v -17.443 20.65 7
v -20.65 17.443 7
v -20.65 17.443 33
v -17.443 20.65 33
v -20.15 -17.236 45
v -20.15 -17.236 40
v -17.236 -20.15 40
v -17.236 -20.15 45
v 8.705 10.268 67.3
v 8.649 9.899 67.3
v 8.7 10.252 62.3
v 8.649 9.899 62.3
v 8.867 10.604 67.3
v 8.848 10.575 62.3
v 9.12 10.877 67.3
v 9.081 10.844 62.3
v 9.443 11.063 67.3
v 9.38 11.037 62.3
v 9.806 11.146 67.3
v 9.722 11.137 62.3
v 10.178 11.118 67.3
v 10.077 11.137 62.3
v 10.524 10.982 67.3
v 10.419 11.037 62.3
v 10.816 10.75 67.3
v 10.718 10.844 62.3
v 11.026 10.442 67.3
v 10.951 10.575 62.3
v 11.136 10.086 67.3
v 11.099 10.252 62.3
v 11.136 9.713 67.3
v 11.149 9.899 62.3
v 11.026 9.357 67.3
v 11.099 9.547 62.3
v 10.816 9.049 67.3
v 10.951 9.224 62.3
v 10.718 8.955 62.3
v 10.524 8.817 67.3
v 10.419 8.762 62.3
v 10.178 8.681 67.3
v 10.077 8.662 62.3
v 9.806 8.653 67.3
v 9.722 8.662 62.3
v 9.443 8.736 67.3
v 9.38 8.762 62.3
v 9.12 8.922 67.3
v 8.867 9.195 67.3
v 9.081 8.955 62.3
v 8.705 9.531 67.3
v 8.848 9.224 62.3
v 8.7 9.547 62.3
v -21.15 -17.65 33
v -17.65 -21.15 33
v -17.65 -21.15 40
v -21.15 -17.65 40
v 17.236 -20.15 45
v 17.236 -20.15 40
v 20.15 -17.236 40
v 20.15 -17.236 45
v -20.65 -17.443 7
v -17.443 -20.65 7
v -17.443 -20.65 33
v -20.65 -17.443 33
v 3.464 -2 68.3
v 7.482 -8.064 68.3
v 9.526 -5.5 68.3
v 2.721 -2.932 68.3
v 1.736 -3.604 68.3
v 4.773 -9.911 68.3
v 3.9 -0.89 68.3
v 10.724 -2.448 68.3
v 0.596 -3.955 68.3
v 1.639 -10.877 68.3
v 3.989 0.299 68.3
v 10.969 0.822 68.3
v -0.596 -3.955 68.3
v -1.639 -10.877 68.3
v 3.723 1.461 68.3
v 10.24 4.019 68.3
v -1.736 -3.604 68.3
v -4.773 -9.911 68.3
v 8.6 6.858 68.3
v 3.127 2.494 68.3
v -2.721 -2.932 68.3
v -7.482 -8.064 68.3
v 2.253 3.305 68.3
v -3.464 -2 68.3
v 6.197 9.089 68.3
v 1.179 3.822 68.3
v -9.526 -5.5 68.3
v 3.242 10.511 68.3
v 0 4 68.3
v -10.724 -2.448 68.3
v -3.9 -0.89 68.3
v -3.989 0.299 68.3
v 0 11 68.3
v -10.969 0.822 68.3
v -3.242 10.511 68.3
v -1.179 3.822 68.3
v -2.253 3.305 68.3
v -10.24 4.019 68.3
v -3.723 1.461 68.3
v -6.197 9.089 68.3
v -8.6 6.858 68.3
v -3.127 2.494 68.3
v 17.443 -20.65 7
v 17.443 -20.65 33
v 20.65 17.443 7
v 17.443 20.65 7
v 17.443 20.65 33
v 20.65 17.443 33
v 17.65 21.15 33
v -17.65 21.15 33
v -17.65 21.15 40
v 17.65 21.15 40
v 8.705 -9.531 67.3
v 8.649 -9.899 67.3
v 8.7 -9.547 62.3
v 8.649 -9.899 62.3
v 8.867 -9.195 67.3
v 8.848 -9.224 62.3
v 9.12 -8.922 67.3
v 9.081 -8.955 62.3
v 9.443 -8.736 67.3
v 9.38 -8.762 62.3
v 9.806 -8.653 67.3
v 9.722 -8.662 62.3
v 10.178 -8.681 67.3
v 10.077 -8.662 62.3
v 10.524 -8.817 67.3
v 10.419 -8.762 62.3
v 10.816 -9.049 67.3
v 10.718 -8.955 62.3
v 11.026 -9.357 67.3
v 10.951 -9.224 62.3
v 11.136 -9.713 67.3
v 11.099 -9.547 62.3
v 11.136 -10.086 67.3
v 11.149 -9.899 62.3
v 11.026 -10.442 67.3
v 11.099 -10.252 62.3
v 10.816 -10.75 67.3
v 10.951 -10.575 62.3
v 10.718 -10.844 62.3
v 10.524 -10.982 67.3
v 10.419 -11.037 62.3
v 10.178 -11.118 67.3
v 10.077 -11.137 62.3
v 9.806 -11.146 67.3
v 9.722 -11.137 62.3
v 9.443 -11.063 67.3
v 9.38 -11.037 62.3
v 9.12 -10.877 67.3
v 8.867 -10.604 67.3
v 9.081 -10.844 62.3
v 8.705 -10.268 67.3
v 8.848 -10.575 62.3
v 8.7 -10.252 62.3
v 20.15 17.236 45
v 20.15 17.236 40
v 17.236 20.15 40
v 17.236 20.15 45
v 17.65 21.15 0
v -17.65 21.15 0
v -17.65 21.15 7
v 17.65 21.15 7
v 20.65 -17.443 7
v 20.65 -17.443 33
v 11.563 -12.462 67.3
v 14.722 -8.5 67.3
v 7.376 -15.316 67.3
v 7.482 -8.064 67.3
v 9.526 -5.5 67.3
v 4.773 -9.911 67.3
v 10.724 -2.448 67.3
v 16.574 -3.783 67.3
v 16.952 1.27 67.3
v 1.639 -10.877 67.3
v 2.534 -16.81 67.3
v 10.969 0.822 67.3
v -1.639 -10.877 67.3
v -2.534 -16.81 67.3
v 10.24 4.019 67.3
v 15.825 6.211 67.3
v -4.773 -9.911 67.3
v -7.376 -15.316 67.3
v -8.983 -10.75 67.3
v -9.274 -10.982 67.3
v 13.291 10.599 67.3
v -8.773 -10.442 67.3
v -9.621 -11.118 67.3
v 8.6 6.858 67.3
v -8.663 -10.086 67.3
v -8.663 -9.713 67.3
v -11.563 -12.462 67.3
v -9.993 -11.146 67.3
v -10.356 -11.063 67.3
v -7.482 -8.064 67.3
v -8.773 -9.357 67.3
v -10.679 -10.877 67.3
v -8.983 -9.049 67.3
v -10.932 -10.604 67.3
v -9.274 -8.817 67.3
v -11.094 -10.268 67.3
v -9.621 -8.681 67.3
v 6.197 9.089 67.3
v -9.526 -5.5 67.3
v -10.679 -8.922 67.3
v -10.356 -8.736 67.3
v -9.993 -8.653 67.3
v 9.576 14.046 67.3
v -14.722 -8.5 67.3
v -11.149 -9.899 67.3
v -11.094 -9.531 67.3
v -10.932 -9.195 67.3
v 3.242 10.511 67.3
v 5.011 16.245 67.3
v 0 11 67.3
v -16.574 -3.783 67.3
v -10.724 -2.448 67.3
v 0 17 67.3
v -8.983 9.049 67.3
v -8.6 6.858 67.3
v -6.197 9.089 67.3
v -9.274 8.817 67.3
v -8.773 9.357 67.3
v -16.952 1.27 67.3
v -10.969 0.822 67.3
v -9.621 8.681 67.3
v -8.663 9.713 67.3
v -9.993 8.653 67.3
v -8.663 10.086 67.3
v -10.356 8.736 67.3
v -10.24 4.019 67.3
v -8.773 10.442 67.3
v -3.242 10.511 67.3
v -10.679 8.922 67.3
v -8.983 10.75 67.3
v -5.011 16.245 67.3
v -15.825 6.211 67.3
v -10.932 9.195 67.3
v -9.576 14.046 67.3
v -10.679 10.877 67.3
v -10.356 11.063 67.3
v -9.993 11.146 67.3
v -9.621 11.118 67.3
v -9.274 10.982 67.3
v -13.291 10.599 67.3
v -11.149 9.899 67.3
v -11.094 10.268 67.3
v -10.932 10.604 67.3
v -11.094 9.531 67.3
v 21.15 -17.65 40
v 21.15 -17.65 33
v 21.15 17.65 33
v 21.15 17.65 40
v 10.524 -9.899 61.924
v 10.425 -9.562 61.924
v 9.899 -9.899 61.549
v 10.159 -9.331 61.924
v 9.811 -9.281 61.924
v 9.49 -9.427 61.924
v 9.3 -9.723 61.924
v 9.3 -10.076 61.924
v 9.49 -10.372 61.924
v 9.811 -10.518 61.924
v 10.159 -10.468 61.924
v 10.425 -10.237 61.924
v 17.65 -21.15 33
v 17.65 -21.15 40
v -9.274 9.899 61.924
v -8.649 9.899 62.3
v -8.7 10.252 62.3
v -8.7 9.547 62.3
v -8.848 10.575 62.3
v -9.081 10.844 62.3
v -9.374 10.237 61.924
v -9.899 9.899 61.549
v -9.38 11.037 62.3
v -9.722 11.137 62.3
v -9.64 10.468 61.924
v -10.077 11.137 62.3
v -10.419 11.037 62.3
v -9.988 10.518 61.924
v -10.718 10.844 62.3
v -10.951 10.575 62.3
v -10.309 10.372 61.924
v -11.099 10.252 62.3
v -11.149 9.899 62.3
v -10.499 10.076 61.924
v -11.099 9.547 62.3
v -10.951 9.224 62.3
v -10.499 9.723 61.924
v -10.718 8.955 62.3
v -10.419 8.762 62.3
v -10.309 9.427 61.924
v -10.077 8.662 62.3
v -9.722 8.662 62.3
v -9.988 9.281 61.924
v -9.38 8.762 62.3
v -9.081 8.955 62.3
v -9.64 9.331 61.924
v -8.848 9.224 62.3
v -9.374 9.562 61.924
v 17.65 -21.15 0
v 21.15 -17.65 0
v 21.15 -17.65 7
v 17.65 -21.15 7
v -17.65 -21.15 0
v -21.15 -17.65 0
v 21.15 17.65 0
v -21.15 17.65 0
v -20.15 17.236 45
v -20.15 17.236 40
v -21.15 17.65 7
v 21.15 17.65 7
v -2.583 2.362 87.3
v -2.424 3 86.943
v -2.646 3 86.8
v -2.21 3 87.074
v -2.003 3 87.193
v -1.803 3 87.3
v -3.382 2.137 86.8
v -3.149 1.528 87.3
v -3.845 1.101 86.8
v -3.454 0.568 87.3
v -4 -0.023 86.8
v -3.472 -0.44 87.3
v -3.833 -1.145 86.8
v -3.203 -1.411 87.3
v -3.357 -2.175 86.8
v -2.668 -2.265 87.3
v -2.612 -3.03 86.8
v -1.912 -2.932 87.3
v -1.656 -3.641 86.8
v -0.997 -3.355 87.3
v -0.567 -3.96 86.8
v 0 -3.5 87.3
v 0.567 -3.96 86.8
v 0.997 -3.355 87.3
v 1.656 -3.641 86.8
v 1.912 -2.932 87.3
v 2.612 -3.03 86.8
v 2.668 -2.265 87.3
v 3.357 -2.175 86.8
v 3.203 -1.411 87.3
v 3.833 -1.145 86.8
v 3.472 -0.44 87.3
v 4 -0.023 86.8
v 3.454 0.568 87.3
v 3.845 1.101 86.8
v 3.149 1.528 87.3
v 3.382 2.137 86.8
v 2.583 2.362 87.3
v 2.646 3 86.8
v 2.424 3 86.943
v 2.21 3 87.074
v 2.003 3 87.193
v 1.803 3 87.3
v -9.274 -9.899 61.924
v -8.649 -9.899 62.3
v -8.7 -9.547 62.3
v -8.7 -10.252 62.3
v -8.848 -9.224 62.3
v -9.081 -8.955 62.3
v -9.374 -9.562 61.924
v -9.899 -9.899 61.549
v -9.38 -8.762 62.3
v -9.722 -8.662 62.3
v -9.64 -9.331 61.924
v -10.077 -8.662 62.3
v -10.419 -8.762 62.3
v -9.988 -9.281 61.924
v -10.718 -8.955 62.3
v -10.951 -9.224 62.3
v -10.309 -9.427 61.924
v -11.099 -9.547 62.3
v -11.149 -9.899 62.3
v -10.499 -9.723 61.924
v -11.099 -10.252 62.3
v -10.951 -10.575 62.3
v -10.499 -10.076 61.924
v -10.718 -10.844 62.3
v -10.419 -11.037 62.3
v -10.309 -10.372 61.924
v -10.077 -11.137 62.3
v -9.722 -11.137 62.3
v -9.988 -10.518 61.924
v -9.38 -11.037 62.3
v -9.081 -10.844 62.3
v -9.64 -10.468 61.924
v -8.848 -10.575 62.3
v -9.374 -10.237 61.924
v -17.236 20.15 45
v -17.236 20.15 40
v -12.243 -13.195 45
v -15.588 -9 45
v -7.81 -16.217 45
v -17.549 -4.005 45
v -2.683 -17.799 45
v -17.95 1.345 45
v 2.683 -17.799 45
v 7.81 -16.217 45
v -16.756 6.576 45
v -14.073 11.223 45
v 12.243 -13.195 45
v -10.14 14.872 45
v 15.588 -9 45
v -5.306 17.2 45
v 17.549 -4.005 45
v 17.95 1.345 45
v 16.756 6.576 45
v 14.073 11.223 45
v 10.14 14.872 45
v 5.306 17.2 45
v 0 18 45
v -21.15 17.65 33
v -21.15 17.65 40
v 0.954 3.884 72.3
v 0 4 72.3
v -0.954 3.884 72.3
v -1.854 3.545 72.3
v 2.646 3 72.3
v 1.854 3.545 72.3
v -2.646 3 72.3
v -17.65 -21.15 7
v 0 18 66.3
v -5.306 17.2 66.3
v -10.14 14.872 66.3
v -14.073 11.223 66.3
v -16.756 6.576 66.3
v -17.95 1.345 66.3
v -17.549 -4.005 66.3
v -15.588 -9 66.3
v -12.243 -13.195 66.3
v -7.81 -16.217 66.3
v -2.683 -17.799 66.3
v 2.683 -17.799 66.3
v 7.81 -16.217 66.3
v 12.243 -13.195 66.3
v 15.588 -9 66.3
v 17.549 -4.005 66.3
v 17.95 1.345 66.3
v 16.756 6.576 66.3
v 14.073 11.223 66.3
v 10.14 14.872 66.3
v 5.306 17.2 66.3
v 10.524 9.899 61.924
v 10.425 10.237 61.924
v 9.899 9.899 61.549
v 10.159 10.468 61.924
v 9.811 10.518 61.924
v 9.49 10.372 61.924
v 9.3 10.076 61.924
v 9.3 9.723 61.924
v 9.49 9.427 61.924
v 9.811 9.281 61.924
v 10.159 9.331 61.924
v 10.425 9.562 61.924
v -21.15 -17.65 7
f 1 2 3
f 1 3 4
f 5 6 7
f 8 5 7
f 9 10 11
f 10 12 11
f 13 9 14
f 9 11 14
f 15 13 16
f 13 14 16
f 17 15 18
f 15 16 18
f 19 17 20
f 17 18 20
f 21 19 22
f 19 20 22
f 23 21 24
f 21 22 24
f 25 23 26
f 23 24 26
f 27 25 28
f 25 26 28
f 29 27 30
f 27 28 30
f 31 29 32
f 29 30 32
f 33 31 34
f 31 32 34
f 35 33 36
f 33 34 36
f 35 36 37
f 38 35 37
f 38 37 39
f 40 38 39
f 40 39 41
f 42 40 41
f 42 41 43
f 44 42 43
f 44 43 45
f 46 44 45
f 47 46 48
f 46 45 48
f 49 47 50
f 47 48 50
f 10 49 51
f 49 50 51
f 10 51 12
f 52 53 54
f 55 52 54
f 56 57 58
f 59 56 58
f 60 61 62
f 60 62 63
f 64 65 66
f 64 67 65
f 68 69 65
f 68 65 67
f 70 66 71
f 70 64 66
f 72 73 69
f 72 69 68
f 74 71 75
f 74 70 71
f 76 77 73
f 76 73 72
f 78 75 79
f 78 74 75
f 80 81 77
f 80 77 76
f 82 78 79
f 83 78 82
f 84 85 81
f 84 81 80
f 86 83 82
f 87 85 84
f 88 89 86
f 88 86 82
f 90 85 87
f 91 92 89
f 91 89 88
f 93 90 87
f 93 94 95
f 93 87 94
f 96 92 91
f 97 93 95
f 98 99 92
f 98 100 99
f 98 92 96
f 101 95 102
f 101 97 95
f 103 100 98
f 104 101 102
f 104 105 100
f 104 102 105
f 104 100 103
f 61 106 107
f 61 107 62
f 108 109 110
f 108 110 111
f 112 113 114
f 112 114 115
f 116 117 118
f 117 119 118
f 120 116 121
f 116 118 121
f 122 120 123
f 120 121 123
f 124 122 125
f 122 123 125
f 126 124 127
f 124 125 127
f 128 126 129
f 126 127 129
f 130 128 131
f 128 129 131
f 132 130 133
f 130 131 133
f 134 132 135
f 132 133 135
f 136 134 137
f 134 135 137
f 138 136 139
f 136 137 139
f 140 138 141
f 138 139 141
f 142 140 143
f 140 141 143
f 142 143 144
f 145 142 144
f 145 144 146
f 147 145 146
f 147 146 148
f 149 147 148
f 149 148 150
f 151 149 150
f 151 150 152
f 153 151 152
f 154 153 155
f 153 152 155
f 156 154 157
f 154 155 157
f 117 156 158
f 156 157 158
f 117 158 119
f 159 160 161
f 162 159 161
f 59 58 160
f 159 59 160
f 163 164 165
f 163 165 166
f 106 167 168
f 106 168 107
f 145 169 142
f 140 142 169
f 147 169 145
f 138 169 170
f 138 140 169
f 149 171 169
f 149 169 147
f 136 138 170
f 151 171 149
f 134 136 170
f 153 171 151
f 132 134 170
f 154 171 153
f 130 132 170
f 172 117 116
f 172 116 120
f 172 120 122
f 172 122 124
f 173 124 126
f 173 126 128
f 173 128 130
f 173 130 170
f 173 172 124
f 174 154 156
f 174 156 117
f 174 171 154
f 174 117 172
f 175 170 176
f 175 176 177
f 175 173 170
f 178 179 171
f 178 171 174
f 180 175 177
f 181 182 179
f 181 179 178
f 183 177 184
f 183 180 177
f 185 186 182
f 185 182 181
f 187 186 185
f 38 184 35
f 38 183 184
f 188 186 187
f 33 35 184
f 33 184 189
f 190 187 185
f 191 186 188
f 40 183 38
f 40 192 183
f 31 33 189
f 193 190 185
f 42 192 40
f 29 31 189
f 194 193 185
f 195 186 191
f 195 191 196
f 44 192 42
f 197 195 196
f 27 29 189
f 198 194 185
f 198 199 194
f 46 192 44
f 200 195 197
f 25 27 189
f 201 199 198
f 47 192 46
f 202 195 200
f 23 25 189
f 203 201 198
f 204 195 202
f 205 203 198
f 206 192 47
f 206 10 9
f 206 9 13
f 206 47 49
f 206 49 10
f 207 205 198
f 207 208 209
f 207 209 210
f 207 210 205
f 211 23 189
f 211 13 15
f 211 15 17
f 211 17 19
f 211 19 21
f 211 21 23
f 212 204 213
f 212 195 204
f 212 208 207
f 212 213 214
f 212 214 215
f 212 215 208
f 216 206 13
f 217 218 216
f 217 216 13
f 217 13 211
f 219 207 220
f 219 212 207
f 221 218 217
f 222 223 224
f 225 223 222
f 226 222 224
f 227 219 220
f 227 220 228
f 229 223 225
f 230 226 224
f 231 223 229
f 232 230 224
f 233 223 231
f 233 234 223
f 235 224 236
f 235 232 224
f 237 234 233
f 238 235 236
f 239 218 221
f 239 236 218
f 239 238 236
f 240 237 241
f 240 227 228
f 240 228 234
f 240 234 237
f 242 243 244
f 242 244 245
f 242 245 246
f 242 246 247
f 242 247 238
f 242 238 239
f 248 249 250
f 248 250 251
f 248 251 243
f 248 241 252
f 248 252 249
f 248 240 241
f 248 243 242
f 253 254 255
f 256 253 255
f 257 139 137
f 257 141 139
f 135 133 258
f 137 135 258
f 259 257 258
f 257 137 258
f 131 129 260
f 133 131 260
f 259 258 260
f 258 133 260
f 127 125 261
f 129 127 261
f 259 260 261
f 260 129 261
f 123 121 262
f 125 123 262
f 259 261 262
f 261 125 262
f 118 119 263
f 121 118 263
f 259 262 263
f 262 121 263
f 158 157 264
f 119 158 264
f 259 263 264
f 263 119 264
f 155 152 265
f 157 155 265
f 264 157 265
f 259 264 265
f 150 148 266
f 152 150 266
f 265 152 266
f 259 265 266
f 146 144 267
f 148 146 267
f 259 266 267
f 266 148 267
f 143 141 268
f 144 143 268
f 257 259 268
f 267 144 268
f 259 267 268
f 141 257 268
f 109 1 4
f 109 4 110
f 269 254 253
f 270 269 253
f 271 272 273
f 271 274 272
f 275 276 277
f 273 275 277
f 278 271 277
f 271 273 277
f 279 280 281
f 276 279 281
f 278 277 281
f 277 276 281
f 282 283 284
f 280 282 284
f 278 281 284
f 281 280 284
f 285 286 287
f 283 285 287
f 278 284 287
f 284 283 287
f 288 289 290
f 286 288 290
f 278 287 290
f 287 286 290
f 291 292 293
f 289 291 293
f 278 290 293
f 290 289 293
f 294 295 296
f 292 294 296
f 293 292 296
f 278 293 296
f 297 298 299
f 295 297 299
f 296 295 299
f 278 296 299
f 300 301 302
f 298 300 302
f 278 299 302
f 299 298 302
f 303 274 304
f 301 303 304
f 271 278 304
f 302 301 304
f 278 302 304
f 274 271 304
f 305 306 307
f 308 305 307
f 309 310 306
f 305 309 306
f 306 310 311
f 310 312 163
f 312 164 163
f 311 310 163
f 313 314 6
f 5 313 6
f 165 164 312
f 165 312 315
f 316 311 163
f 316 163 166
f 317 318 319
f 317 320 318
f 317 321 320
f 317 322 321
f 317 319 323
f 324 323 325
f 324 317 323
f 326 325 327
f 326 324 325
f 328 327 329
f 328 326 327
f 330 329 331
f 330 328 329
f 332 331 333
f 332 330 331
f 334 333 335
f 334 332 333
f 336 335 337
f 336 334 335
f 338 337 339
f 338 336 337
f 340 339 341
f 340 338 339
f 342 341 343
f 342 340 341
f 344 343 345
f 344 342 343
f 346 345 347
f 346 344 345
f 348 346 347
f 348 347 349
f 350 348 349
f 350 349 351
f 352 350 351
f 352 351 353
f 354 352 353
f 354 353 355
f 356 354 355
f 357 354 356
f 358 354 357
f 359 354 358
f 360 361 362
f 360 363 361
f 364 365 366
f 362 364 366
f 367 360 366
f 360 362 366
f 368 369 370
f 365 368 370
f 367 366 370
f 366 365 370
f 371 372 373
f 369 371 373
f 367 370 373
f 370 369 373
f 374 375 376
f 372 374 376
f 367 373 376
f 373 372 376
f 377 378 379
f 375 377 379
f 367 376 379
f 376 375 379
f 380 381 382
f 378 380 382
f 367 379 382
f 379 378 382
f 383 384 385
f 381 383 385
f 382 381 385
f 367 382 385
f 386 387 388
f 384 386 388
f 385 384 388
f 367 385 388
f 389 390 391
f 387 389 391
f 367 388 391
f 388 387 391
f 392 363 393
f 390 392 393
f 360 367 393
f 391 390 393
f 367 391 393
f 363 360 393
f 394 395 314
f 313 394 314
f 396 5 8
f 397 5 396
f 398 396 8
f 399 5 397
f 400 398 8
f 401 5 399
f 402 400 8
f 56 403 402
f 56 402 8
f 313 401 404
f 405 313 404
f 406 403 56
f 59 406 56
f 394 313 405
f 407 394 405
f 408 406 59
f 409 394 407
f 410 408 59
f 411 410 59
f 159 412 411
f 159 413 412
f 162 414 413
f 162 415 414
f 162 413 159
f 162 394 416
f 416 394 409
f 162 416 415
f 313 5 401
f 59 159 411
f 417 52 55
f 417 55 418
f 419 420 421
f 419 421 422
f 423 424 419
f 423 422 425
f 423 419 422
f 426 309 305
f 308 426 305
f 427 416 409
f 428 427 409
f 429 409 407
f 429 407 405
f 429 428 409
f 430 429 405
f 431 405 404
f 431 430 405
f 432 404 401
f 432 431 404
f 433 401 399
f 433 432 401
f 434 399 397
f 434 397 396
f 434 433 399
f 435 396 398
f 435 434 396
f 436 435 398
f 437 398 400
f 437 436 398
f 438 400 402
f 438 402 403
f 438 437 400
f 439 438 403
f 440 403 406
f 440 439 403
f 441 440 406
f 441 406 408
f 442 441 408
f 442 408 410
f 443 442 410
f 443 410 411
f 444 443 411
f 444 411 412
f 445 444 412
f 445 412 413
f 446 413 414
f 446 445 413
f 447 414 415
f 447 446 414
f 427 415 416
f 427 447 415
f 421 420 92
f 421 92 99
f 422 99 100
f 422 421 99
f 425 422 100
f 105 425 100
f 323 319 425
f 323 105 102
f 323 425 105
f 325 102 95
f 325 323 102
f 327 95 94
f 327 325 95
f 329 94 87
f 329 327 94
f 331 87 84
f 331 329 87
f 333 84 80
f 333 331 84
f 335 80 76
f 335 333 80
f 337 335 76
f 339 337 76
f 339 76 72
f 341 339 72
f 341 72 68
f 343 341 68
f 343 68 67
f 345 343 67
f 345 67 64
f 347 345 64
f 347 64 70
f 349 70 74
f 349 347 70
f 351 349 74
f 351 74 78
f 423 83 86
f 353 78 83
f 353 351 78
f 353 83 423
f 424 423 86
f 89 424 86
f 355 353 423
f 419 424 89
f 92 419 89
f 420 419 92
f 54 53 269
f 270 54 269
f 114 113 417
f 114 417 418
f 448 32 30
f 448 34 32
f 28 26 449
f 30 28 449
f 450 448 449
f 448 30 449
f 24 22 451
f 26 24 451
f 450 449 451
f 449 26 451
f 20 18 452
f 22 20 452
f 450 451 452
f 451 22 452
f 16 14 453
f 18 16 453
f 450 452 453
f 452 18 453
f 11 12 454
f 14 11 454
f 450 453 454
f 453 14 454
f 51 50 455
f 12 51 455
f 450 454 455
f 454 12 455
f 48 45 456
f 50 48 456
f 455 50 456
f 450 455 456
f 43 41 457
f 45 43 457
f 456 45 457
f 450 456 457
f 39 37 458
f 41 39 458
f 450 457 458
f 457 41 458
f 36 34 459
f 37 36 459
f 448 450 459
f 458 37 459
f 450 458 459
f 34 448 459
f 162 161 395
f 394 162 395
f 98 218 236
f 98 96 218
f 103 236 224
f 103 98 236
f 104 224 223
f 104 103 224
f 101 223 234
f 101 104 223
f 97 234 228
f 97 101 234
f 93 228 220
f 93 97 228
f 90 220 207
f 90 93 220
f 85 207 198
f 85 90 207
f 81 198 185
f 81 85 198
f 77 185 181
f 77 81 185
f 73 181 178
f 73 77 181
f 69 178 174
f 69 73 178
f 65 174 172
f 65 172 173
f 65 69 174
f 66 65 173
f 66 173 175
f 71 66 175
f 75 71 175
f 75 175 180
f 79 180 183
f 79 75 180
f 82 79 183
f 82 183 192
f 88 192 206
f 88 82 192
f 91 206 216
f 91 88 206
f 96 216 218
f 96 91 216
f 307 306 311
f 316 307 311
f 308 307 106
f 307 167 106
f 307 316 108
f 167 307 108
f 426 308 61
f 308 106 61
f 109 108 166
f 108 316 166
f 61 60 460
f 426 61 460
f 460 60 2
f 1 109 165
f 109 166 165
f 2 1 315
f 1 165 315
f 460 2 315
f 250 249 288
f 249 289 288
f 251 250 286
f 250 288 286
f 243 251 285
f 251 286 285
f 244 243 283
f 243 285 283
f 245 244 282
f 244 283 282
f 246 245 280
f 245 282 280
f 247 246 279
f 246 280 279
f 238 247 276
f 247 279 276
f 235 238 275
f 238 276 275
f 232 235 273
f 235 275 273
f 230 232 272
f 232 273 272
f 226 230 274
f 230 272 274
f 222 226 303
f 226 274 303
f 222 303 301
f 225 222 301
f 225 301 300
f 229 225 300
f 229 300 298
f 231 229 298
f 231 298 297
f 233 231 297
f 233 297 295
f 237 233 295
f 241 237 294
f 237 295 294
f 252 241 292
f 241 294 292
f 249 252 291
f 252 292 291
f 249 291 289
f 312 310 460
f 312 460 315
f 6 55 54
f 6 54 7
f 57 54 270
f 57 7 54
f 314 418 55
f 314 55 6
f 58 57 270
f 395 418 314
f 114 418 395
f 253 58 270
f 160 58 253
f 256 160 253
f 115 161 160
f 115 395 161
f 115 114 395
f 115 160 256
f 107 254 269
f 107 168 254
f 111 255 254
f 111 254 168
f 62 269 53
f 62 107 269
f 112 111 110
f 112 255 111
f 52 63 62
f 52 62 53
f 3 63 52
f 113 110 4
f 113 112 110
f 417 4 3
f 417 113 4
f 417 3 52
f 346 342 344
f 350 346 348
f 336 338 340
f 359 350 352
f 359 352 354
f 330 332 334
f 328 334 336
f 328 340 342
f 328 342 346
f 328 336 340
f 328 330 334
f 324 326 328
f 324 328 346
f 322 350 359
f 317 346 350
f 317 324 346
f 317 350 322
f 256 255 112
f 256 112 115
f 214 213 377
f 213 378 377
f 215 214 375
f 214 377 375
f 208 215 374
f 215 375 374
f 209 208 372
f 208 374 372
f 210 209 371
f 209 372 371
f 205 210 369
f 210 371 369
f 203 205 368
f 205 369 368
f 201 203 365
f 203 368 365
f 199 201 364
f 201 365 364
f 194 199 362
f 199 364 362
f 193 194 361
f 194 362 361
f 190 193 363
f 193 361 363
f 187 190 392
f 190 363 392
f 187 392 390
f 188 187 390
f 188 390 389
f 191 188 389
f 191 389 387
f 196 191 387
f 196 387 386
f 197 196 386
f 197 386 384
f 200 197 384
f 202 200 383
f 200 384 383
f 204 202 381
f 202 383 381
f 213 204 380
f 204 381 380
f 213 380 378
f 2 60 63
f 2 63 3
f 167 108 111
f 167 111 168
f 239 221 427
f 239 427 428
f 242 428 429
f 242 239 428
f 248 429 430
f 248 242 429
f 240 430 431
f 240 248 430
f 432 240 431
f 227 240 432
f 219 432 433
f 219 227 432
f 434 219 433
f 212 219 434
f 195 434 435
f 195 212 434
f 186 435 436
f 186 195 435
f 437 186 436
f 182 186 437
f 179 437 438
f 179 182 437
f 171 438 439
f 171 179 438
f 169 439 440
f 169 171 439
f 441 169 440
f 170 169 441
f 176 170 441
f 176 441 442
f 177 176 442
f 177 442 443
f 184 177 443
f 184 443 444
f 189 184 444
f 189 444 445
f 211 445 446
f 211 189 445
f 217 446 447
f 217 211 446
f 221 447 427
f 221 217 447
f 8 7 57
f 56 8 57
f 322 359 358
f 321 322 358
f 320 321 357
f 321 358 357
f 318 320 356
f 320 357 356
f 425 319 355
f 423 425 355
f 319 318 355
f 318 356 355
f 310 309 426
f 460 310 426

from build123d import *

# Parameters (mm, degrees)
SKIZZE1_W                       = 42.3
SKIZZE1_H                       = 42.3
AUFSATZ_LINEAR_AUSTRAGEN1_DEPTH = 40
FASE1_SIZE                      = 3.5
SCHNITT_LINEAR_AUSTRAGEN1_DEPTH = 15
FASE2_SIZE                      = 0.5
AUFSATZ_LINEAR_AUSTRAGEN2_DEPTH = 5
M3_GEWINDEBOHRUNG1_D            = 2.5
M3_GEWINDEBOHRUNG1_DEPTH        = 5
M3_GEWINDEBOHRUNG1_TIP          = 0.751075774
FASE3_SIZE                      = 1
SCHNITT_LINEAR_START            = -7
SCHNITT_LINEAR_AUSTRAGEN2_DEPTH = 26


with BuildPart() as part:
    # Skizze1 → Aufsatz-Linear austragen1 (new body)
    with BuildSketch(Plane.XY):
        Rectangle(SKIZZE1_W, SKIZZE1_H)
    extrude(amount=AUFSATZ_LINEAR_AUSTRAGEN1_DEPTH)

    # Skizze3 → Rotation1 (revolve)
    with BuildSketch(Plane(origin=(0, 0, 0), x_dir=(0, 0, -1), z_dir=(1, 0, 0))):
        Polygon((-40, 18), (-67.3, 18), (-67.3, 11), (-68.3, 11), (-68.3, 4), (-87.3, 4), (-87.3, 0), (-40, 0), align=None)
    revolve(axis=Axis((0, 0, 0), (0, 0, 1)))

    # Fase1
    fase1_edges = [part.edges().sort_by_distance(p)[0] for p in [
        (-21.15, 21.15, 20),
        (21.15, 21.15, 20),
        (21.15, -21.15, 20),
        (-21.15, -21.15, 20),
    ]]
    chamfer(fase1_edges, length=FASE1_SIZE)

    # Skizze4 → Schnitt-Linear austragen1 (cut)
    with BuildSketch(Plane.XY.offset(87.3)):
        with BuildLine():
            Line((-2.645751311, 3), (2.645751311, 3))
            ThreePointArc((2.645751311, 3), (0, 4), (-2.645751311, 3))
        make_face()
    extrude(amount=-SCHNITT_LINEAR_AUSTRAGEN1_DEPTH, mode=Mode.SUBTRACT)

    # Fase2
    fase2_edges = [part.edges().sort_by_distance(p)[0] for p in [
        (0, -4, 87.3),
    ]]
    chamfer(fase2_edges, length=FASE2_SIZE)

    # Skizze5 → Aufsatz-Linear austragen2 (add)
    with BuildSketch(Plane.XY.offset(40)):
        Polygon((20.15, 17.235786438), (17.235786438, 20.15), (-17.235786438, 20.15), (-20.15, 17.235786438), (-20.15, -17.235786438), (-17.235786438, -20.15), (17.235786438, -20.15), (20.15, -17.235786438), align=None)
    extrude(amount=AUFSATZ_LINEAR_AUSTRAGEN2_DEPTH)

    # M3 Gewindebohrung1
    with Locations(Plane.XY.offset(67.3)):
        with Locations((9.899494937, 9.899494937), (-9.899494937, 9.899494937), (-9.899494937, -9.899494937), (9.899494937, -9.899494937)):
            Hole(M3_GEWINDEBOHRUNG1_D / 2, depth=M3_GEWINDEBOHRUNG1_DEPTH)
            with Locations((0, 0, -(M3_GEWINDEBOHRUNG1_DEPTH + M3_GEWINDEBOHRUNG1_TIP / 2))):  # 118° drill point
                Cone(0, M3_GEWINDEBOHRUNG1_D / 2, M3_GEWINDEBOHRUNG1_TIP, mode=Mode.SUBTRACT)

    # Fase3
    fase3_edges = [part.edges().sort_by_distance(p)[0] for p in [
        (0, -18, 67.3),
    ]]
    chamfer(fase3_edges, length=FASE3_SIZE)

    # Skizze8 → Schnitt-Linear austragen2 (cut)
    with BuildSketch(Plane(origin=(0, 0, 0), x_dir=(-1, 0, 0), z_dir=(0, 0, -1)).offset(SCHNITT_LINEAR_START)):
        Polygon((17.65, 21.15), (-17.65, 21.15), (-21.15, 17.65), (-21.15, -17.65), (-17.65, -21.15), (17.65, -21.15), (21.15, -17.65), (21.15, 17.65), align=None)
        Polygon((17.442893219, 20.65), (-17.442893219, 20.65), (-20.65, 17.442893219), (-20.65, -17.442893219), (-17.442893219, -20.65), (17.442893219, -20.65), (20.65, -17.442893219), (20.65, 17.442893219), align=None, mode=Mode.SUBTRACT)
    extrude(amount=-SCHNITT_LINEAR_AUSTRAGEN2_DEPTH, mode=Mode.SUBTRACT)


solid = part.part
